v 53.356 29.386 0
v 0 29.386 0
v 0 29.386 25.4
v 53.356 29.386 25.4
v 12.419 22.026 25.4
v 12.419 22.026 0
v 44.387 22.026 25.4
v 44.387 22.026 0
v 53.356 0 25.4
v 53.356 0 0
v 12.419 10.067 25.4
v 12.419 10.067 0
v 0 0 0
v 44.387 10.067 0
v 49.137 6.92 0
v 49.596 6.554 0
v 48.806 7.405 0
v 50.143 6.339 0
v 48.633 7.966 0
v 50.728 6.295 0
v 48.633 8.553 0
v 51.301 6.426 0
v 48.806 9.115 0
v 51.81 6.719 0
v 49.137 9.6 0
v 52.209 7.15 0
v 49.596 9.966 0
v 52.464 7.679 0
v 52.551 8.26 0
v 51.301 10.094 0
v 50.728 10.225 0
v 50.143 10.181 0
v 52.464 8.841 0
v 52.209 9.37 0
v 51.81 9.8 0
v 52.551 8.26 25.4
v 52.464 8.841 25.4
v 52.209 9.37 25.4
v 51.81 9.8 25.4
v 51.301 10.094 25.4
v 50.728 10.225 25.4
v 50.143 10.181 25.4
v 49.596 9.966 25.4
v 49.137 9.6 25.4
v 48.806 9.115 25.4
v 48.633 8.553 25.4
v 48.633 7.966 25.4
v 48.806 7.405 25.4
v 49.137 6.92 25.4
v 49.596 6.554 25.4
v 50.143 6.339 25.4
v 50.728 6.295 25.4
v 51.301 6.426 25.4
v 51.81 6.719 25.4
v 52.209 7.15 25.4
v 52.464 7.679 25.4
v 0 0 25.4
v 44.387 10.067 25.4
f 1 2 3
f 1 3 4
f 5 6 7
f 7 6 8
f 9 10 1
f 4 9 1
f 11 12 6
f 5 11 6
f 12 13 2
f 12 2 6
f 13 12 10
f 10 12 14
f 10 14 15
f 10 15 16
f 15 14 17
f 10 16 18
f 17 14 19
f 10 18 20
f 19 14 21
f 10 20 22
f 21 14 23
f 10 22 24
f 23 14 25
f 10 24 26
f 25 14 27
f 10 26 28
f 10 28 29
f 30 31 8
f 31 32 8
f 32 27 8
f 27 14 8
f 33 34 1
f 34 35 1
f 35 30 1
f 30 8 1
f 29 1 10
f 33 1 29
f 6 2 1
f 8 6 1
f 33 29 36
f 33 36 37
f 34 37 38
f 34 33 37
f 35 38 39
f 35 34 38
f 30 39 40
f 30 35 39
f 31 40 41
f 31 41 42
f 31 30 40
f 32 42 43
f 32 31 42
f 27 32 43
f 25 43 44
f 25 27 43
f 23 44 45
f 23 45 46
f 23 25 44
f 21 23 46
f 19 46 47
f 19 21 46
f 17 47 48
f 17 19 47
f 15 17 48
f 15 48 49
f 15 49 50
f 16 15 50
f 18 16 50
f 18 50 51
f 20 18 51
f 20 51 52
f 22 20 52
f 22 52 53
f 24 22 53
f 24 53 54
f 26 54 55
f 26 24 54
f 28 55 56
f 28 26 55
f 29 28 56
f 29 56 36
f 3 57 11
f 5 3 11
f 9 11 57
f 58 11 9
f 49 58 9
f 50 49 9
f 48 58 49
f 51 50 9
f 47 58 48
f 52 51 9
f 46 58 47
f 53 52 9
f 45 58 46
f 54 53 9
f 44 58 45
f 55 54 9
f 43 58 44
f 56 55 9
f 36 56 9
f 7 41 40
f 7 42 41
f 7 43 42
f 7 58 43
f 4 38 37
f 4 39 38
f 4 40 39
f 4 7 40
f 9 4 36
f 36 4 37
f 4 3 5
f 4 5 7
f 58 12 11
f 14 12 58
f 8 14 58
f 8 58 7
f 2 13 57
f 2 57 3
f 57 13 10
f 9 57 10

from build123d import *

# Parameters (mm, degrees)
F0_W     = 53.355787
F0_H     = 29.385667
F0_R     = 1.970291
F0_W_2   = 31.967147
F0_H_2   = 11.958933
F1_DEPTH = 25.4


with BuildPart() as f1:
    # F0 (on Top) → F1 (new body)
    with BuildSketch(Plane.XY):
        with Locations((26.677893, 14.692833)):
            Rectangle(F0_W, F0_H)
        with Locations((50.581049, 8.259824)):
            Circle(F0_R, mode=Mode.SUBTRACT)
        with Locations((28.403014, 16.046856)):
            Rectangle(F0_W_2, F0_H_2, mode=Mode.SUBTRACT)
    extrude(amount=F1_DEPTH)


solid = f1.part
